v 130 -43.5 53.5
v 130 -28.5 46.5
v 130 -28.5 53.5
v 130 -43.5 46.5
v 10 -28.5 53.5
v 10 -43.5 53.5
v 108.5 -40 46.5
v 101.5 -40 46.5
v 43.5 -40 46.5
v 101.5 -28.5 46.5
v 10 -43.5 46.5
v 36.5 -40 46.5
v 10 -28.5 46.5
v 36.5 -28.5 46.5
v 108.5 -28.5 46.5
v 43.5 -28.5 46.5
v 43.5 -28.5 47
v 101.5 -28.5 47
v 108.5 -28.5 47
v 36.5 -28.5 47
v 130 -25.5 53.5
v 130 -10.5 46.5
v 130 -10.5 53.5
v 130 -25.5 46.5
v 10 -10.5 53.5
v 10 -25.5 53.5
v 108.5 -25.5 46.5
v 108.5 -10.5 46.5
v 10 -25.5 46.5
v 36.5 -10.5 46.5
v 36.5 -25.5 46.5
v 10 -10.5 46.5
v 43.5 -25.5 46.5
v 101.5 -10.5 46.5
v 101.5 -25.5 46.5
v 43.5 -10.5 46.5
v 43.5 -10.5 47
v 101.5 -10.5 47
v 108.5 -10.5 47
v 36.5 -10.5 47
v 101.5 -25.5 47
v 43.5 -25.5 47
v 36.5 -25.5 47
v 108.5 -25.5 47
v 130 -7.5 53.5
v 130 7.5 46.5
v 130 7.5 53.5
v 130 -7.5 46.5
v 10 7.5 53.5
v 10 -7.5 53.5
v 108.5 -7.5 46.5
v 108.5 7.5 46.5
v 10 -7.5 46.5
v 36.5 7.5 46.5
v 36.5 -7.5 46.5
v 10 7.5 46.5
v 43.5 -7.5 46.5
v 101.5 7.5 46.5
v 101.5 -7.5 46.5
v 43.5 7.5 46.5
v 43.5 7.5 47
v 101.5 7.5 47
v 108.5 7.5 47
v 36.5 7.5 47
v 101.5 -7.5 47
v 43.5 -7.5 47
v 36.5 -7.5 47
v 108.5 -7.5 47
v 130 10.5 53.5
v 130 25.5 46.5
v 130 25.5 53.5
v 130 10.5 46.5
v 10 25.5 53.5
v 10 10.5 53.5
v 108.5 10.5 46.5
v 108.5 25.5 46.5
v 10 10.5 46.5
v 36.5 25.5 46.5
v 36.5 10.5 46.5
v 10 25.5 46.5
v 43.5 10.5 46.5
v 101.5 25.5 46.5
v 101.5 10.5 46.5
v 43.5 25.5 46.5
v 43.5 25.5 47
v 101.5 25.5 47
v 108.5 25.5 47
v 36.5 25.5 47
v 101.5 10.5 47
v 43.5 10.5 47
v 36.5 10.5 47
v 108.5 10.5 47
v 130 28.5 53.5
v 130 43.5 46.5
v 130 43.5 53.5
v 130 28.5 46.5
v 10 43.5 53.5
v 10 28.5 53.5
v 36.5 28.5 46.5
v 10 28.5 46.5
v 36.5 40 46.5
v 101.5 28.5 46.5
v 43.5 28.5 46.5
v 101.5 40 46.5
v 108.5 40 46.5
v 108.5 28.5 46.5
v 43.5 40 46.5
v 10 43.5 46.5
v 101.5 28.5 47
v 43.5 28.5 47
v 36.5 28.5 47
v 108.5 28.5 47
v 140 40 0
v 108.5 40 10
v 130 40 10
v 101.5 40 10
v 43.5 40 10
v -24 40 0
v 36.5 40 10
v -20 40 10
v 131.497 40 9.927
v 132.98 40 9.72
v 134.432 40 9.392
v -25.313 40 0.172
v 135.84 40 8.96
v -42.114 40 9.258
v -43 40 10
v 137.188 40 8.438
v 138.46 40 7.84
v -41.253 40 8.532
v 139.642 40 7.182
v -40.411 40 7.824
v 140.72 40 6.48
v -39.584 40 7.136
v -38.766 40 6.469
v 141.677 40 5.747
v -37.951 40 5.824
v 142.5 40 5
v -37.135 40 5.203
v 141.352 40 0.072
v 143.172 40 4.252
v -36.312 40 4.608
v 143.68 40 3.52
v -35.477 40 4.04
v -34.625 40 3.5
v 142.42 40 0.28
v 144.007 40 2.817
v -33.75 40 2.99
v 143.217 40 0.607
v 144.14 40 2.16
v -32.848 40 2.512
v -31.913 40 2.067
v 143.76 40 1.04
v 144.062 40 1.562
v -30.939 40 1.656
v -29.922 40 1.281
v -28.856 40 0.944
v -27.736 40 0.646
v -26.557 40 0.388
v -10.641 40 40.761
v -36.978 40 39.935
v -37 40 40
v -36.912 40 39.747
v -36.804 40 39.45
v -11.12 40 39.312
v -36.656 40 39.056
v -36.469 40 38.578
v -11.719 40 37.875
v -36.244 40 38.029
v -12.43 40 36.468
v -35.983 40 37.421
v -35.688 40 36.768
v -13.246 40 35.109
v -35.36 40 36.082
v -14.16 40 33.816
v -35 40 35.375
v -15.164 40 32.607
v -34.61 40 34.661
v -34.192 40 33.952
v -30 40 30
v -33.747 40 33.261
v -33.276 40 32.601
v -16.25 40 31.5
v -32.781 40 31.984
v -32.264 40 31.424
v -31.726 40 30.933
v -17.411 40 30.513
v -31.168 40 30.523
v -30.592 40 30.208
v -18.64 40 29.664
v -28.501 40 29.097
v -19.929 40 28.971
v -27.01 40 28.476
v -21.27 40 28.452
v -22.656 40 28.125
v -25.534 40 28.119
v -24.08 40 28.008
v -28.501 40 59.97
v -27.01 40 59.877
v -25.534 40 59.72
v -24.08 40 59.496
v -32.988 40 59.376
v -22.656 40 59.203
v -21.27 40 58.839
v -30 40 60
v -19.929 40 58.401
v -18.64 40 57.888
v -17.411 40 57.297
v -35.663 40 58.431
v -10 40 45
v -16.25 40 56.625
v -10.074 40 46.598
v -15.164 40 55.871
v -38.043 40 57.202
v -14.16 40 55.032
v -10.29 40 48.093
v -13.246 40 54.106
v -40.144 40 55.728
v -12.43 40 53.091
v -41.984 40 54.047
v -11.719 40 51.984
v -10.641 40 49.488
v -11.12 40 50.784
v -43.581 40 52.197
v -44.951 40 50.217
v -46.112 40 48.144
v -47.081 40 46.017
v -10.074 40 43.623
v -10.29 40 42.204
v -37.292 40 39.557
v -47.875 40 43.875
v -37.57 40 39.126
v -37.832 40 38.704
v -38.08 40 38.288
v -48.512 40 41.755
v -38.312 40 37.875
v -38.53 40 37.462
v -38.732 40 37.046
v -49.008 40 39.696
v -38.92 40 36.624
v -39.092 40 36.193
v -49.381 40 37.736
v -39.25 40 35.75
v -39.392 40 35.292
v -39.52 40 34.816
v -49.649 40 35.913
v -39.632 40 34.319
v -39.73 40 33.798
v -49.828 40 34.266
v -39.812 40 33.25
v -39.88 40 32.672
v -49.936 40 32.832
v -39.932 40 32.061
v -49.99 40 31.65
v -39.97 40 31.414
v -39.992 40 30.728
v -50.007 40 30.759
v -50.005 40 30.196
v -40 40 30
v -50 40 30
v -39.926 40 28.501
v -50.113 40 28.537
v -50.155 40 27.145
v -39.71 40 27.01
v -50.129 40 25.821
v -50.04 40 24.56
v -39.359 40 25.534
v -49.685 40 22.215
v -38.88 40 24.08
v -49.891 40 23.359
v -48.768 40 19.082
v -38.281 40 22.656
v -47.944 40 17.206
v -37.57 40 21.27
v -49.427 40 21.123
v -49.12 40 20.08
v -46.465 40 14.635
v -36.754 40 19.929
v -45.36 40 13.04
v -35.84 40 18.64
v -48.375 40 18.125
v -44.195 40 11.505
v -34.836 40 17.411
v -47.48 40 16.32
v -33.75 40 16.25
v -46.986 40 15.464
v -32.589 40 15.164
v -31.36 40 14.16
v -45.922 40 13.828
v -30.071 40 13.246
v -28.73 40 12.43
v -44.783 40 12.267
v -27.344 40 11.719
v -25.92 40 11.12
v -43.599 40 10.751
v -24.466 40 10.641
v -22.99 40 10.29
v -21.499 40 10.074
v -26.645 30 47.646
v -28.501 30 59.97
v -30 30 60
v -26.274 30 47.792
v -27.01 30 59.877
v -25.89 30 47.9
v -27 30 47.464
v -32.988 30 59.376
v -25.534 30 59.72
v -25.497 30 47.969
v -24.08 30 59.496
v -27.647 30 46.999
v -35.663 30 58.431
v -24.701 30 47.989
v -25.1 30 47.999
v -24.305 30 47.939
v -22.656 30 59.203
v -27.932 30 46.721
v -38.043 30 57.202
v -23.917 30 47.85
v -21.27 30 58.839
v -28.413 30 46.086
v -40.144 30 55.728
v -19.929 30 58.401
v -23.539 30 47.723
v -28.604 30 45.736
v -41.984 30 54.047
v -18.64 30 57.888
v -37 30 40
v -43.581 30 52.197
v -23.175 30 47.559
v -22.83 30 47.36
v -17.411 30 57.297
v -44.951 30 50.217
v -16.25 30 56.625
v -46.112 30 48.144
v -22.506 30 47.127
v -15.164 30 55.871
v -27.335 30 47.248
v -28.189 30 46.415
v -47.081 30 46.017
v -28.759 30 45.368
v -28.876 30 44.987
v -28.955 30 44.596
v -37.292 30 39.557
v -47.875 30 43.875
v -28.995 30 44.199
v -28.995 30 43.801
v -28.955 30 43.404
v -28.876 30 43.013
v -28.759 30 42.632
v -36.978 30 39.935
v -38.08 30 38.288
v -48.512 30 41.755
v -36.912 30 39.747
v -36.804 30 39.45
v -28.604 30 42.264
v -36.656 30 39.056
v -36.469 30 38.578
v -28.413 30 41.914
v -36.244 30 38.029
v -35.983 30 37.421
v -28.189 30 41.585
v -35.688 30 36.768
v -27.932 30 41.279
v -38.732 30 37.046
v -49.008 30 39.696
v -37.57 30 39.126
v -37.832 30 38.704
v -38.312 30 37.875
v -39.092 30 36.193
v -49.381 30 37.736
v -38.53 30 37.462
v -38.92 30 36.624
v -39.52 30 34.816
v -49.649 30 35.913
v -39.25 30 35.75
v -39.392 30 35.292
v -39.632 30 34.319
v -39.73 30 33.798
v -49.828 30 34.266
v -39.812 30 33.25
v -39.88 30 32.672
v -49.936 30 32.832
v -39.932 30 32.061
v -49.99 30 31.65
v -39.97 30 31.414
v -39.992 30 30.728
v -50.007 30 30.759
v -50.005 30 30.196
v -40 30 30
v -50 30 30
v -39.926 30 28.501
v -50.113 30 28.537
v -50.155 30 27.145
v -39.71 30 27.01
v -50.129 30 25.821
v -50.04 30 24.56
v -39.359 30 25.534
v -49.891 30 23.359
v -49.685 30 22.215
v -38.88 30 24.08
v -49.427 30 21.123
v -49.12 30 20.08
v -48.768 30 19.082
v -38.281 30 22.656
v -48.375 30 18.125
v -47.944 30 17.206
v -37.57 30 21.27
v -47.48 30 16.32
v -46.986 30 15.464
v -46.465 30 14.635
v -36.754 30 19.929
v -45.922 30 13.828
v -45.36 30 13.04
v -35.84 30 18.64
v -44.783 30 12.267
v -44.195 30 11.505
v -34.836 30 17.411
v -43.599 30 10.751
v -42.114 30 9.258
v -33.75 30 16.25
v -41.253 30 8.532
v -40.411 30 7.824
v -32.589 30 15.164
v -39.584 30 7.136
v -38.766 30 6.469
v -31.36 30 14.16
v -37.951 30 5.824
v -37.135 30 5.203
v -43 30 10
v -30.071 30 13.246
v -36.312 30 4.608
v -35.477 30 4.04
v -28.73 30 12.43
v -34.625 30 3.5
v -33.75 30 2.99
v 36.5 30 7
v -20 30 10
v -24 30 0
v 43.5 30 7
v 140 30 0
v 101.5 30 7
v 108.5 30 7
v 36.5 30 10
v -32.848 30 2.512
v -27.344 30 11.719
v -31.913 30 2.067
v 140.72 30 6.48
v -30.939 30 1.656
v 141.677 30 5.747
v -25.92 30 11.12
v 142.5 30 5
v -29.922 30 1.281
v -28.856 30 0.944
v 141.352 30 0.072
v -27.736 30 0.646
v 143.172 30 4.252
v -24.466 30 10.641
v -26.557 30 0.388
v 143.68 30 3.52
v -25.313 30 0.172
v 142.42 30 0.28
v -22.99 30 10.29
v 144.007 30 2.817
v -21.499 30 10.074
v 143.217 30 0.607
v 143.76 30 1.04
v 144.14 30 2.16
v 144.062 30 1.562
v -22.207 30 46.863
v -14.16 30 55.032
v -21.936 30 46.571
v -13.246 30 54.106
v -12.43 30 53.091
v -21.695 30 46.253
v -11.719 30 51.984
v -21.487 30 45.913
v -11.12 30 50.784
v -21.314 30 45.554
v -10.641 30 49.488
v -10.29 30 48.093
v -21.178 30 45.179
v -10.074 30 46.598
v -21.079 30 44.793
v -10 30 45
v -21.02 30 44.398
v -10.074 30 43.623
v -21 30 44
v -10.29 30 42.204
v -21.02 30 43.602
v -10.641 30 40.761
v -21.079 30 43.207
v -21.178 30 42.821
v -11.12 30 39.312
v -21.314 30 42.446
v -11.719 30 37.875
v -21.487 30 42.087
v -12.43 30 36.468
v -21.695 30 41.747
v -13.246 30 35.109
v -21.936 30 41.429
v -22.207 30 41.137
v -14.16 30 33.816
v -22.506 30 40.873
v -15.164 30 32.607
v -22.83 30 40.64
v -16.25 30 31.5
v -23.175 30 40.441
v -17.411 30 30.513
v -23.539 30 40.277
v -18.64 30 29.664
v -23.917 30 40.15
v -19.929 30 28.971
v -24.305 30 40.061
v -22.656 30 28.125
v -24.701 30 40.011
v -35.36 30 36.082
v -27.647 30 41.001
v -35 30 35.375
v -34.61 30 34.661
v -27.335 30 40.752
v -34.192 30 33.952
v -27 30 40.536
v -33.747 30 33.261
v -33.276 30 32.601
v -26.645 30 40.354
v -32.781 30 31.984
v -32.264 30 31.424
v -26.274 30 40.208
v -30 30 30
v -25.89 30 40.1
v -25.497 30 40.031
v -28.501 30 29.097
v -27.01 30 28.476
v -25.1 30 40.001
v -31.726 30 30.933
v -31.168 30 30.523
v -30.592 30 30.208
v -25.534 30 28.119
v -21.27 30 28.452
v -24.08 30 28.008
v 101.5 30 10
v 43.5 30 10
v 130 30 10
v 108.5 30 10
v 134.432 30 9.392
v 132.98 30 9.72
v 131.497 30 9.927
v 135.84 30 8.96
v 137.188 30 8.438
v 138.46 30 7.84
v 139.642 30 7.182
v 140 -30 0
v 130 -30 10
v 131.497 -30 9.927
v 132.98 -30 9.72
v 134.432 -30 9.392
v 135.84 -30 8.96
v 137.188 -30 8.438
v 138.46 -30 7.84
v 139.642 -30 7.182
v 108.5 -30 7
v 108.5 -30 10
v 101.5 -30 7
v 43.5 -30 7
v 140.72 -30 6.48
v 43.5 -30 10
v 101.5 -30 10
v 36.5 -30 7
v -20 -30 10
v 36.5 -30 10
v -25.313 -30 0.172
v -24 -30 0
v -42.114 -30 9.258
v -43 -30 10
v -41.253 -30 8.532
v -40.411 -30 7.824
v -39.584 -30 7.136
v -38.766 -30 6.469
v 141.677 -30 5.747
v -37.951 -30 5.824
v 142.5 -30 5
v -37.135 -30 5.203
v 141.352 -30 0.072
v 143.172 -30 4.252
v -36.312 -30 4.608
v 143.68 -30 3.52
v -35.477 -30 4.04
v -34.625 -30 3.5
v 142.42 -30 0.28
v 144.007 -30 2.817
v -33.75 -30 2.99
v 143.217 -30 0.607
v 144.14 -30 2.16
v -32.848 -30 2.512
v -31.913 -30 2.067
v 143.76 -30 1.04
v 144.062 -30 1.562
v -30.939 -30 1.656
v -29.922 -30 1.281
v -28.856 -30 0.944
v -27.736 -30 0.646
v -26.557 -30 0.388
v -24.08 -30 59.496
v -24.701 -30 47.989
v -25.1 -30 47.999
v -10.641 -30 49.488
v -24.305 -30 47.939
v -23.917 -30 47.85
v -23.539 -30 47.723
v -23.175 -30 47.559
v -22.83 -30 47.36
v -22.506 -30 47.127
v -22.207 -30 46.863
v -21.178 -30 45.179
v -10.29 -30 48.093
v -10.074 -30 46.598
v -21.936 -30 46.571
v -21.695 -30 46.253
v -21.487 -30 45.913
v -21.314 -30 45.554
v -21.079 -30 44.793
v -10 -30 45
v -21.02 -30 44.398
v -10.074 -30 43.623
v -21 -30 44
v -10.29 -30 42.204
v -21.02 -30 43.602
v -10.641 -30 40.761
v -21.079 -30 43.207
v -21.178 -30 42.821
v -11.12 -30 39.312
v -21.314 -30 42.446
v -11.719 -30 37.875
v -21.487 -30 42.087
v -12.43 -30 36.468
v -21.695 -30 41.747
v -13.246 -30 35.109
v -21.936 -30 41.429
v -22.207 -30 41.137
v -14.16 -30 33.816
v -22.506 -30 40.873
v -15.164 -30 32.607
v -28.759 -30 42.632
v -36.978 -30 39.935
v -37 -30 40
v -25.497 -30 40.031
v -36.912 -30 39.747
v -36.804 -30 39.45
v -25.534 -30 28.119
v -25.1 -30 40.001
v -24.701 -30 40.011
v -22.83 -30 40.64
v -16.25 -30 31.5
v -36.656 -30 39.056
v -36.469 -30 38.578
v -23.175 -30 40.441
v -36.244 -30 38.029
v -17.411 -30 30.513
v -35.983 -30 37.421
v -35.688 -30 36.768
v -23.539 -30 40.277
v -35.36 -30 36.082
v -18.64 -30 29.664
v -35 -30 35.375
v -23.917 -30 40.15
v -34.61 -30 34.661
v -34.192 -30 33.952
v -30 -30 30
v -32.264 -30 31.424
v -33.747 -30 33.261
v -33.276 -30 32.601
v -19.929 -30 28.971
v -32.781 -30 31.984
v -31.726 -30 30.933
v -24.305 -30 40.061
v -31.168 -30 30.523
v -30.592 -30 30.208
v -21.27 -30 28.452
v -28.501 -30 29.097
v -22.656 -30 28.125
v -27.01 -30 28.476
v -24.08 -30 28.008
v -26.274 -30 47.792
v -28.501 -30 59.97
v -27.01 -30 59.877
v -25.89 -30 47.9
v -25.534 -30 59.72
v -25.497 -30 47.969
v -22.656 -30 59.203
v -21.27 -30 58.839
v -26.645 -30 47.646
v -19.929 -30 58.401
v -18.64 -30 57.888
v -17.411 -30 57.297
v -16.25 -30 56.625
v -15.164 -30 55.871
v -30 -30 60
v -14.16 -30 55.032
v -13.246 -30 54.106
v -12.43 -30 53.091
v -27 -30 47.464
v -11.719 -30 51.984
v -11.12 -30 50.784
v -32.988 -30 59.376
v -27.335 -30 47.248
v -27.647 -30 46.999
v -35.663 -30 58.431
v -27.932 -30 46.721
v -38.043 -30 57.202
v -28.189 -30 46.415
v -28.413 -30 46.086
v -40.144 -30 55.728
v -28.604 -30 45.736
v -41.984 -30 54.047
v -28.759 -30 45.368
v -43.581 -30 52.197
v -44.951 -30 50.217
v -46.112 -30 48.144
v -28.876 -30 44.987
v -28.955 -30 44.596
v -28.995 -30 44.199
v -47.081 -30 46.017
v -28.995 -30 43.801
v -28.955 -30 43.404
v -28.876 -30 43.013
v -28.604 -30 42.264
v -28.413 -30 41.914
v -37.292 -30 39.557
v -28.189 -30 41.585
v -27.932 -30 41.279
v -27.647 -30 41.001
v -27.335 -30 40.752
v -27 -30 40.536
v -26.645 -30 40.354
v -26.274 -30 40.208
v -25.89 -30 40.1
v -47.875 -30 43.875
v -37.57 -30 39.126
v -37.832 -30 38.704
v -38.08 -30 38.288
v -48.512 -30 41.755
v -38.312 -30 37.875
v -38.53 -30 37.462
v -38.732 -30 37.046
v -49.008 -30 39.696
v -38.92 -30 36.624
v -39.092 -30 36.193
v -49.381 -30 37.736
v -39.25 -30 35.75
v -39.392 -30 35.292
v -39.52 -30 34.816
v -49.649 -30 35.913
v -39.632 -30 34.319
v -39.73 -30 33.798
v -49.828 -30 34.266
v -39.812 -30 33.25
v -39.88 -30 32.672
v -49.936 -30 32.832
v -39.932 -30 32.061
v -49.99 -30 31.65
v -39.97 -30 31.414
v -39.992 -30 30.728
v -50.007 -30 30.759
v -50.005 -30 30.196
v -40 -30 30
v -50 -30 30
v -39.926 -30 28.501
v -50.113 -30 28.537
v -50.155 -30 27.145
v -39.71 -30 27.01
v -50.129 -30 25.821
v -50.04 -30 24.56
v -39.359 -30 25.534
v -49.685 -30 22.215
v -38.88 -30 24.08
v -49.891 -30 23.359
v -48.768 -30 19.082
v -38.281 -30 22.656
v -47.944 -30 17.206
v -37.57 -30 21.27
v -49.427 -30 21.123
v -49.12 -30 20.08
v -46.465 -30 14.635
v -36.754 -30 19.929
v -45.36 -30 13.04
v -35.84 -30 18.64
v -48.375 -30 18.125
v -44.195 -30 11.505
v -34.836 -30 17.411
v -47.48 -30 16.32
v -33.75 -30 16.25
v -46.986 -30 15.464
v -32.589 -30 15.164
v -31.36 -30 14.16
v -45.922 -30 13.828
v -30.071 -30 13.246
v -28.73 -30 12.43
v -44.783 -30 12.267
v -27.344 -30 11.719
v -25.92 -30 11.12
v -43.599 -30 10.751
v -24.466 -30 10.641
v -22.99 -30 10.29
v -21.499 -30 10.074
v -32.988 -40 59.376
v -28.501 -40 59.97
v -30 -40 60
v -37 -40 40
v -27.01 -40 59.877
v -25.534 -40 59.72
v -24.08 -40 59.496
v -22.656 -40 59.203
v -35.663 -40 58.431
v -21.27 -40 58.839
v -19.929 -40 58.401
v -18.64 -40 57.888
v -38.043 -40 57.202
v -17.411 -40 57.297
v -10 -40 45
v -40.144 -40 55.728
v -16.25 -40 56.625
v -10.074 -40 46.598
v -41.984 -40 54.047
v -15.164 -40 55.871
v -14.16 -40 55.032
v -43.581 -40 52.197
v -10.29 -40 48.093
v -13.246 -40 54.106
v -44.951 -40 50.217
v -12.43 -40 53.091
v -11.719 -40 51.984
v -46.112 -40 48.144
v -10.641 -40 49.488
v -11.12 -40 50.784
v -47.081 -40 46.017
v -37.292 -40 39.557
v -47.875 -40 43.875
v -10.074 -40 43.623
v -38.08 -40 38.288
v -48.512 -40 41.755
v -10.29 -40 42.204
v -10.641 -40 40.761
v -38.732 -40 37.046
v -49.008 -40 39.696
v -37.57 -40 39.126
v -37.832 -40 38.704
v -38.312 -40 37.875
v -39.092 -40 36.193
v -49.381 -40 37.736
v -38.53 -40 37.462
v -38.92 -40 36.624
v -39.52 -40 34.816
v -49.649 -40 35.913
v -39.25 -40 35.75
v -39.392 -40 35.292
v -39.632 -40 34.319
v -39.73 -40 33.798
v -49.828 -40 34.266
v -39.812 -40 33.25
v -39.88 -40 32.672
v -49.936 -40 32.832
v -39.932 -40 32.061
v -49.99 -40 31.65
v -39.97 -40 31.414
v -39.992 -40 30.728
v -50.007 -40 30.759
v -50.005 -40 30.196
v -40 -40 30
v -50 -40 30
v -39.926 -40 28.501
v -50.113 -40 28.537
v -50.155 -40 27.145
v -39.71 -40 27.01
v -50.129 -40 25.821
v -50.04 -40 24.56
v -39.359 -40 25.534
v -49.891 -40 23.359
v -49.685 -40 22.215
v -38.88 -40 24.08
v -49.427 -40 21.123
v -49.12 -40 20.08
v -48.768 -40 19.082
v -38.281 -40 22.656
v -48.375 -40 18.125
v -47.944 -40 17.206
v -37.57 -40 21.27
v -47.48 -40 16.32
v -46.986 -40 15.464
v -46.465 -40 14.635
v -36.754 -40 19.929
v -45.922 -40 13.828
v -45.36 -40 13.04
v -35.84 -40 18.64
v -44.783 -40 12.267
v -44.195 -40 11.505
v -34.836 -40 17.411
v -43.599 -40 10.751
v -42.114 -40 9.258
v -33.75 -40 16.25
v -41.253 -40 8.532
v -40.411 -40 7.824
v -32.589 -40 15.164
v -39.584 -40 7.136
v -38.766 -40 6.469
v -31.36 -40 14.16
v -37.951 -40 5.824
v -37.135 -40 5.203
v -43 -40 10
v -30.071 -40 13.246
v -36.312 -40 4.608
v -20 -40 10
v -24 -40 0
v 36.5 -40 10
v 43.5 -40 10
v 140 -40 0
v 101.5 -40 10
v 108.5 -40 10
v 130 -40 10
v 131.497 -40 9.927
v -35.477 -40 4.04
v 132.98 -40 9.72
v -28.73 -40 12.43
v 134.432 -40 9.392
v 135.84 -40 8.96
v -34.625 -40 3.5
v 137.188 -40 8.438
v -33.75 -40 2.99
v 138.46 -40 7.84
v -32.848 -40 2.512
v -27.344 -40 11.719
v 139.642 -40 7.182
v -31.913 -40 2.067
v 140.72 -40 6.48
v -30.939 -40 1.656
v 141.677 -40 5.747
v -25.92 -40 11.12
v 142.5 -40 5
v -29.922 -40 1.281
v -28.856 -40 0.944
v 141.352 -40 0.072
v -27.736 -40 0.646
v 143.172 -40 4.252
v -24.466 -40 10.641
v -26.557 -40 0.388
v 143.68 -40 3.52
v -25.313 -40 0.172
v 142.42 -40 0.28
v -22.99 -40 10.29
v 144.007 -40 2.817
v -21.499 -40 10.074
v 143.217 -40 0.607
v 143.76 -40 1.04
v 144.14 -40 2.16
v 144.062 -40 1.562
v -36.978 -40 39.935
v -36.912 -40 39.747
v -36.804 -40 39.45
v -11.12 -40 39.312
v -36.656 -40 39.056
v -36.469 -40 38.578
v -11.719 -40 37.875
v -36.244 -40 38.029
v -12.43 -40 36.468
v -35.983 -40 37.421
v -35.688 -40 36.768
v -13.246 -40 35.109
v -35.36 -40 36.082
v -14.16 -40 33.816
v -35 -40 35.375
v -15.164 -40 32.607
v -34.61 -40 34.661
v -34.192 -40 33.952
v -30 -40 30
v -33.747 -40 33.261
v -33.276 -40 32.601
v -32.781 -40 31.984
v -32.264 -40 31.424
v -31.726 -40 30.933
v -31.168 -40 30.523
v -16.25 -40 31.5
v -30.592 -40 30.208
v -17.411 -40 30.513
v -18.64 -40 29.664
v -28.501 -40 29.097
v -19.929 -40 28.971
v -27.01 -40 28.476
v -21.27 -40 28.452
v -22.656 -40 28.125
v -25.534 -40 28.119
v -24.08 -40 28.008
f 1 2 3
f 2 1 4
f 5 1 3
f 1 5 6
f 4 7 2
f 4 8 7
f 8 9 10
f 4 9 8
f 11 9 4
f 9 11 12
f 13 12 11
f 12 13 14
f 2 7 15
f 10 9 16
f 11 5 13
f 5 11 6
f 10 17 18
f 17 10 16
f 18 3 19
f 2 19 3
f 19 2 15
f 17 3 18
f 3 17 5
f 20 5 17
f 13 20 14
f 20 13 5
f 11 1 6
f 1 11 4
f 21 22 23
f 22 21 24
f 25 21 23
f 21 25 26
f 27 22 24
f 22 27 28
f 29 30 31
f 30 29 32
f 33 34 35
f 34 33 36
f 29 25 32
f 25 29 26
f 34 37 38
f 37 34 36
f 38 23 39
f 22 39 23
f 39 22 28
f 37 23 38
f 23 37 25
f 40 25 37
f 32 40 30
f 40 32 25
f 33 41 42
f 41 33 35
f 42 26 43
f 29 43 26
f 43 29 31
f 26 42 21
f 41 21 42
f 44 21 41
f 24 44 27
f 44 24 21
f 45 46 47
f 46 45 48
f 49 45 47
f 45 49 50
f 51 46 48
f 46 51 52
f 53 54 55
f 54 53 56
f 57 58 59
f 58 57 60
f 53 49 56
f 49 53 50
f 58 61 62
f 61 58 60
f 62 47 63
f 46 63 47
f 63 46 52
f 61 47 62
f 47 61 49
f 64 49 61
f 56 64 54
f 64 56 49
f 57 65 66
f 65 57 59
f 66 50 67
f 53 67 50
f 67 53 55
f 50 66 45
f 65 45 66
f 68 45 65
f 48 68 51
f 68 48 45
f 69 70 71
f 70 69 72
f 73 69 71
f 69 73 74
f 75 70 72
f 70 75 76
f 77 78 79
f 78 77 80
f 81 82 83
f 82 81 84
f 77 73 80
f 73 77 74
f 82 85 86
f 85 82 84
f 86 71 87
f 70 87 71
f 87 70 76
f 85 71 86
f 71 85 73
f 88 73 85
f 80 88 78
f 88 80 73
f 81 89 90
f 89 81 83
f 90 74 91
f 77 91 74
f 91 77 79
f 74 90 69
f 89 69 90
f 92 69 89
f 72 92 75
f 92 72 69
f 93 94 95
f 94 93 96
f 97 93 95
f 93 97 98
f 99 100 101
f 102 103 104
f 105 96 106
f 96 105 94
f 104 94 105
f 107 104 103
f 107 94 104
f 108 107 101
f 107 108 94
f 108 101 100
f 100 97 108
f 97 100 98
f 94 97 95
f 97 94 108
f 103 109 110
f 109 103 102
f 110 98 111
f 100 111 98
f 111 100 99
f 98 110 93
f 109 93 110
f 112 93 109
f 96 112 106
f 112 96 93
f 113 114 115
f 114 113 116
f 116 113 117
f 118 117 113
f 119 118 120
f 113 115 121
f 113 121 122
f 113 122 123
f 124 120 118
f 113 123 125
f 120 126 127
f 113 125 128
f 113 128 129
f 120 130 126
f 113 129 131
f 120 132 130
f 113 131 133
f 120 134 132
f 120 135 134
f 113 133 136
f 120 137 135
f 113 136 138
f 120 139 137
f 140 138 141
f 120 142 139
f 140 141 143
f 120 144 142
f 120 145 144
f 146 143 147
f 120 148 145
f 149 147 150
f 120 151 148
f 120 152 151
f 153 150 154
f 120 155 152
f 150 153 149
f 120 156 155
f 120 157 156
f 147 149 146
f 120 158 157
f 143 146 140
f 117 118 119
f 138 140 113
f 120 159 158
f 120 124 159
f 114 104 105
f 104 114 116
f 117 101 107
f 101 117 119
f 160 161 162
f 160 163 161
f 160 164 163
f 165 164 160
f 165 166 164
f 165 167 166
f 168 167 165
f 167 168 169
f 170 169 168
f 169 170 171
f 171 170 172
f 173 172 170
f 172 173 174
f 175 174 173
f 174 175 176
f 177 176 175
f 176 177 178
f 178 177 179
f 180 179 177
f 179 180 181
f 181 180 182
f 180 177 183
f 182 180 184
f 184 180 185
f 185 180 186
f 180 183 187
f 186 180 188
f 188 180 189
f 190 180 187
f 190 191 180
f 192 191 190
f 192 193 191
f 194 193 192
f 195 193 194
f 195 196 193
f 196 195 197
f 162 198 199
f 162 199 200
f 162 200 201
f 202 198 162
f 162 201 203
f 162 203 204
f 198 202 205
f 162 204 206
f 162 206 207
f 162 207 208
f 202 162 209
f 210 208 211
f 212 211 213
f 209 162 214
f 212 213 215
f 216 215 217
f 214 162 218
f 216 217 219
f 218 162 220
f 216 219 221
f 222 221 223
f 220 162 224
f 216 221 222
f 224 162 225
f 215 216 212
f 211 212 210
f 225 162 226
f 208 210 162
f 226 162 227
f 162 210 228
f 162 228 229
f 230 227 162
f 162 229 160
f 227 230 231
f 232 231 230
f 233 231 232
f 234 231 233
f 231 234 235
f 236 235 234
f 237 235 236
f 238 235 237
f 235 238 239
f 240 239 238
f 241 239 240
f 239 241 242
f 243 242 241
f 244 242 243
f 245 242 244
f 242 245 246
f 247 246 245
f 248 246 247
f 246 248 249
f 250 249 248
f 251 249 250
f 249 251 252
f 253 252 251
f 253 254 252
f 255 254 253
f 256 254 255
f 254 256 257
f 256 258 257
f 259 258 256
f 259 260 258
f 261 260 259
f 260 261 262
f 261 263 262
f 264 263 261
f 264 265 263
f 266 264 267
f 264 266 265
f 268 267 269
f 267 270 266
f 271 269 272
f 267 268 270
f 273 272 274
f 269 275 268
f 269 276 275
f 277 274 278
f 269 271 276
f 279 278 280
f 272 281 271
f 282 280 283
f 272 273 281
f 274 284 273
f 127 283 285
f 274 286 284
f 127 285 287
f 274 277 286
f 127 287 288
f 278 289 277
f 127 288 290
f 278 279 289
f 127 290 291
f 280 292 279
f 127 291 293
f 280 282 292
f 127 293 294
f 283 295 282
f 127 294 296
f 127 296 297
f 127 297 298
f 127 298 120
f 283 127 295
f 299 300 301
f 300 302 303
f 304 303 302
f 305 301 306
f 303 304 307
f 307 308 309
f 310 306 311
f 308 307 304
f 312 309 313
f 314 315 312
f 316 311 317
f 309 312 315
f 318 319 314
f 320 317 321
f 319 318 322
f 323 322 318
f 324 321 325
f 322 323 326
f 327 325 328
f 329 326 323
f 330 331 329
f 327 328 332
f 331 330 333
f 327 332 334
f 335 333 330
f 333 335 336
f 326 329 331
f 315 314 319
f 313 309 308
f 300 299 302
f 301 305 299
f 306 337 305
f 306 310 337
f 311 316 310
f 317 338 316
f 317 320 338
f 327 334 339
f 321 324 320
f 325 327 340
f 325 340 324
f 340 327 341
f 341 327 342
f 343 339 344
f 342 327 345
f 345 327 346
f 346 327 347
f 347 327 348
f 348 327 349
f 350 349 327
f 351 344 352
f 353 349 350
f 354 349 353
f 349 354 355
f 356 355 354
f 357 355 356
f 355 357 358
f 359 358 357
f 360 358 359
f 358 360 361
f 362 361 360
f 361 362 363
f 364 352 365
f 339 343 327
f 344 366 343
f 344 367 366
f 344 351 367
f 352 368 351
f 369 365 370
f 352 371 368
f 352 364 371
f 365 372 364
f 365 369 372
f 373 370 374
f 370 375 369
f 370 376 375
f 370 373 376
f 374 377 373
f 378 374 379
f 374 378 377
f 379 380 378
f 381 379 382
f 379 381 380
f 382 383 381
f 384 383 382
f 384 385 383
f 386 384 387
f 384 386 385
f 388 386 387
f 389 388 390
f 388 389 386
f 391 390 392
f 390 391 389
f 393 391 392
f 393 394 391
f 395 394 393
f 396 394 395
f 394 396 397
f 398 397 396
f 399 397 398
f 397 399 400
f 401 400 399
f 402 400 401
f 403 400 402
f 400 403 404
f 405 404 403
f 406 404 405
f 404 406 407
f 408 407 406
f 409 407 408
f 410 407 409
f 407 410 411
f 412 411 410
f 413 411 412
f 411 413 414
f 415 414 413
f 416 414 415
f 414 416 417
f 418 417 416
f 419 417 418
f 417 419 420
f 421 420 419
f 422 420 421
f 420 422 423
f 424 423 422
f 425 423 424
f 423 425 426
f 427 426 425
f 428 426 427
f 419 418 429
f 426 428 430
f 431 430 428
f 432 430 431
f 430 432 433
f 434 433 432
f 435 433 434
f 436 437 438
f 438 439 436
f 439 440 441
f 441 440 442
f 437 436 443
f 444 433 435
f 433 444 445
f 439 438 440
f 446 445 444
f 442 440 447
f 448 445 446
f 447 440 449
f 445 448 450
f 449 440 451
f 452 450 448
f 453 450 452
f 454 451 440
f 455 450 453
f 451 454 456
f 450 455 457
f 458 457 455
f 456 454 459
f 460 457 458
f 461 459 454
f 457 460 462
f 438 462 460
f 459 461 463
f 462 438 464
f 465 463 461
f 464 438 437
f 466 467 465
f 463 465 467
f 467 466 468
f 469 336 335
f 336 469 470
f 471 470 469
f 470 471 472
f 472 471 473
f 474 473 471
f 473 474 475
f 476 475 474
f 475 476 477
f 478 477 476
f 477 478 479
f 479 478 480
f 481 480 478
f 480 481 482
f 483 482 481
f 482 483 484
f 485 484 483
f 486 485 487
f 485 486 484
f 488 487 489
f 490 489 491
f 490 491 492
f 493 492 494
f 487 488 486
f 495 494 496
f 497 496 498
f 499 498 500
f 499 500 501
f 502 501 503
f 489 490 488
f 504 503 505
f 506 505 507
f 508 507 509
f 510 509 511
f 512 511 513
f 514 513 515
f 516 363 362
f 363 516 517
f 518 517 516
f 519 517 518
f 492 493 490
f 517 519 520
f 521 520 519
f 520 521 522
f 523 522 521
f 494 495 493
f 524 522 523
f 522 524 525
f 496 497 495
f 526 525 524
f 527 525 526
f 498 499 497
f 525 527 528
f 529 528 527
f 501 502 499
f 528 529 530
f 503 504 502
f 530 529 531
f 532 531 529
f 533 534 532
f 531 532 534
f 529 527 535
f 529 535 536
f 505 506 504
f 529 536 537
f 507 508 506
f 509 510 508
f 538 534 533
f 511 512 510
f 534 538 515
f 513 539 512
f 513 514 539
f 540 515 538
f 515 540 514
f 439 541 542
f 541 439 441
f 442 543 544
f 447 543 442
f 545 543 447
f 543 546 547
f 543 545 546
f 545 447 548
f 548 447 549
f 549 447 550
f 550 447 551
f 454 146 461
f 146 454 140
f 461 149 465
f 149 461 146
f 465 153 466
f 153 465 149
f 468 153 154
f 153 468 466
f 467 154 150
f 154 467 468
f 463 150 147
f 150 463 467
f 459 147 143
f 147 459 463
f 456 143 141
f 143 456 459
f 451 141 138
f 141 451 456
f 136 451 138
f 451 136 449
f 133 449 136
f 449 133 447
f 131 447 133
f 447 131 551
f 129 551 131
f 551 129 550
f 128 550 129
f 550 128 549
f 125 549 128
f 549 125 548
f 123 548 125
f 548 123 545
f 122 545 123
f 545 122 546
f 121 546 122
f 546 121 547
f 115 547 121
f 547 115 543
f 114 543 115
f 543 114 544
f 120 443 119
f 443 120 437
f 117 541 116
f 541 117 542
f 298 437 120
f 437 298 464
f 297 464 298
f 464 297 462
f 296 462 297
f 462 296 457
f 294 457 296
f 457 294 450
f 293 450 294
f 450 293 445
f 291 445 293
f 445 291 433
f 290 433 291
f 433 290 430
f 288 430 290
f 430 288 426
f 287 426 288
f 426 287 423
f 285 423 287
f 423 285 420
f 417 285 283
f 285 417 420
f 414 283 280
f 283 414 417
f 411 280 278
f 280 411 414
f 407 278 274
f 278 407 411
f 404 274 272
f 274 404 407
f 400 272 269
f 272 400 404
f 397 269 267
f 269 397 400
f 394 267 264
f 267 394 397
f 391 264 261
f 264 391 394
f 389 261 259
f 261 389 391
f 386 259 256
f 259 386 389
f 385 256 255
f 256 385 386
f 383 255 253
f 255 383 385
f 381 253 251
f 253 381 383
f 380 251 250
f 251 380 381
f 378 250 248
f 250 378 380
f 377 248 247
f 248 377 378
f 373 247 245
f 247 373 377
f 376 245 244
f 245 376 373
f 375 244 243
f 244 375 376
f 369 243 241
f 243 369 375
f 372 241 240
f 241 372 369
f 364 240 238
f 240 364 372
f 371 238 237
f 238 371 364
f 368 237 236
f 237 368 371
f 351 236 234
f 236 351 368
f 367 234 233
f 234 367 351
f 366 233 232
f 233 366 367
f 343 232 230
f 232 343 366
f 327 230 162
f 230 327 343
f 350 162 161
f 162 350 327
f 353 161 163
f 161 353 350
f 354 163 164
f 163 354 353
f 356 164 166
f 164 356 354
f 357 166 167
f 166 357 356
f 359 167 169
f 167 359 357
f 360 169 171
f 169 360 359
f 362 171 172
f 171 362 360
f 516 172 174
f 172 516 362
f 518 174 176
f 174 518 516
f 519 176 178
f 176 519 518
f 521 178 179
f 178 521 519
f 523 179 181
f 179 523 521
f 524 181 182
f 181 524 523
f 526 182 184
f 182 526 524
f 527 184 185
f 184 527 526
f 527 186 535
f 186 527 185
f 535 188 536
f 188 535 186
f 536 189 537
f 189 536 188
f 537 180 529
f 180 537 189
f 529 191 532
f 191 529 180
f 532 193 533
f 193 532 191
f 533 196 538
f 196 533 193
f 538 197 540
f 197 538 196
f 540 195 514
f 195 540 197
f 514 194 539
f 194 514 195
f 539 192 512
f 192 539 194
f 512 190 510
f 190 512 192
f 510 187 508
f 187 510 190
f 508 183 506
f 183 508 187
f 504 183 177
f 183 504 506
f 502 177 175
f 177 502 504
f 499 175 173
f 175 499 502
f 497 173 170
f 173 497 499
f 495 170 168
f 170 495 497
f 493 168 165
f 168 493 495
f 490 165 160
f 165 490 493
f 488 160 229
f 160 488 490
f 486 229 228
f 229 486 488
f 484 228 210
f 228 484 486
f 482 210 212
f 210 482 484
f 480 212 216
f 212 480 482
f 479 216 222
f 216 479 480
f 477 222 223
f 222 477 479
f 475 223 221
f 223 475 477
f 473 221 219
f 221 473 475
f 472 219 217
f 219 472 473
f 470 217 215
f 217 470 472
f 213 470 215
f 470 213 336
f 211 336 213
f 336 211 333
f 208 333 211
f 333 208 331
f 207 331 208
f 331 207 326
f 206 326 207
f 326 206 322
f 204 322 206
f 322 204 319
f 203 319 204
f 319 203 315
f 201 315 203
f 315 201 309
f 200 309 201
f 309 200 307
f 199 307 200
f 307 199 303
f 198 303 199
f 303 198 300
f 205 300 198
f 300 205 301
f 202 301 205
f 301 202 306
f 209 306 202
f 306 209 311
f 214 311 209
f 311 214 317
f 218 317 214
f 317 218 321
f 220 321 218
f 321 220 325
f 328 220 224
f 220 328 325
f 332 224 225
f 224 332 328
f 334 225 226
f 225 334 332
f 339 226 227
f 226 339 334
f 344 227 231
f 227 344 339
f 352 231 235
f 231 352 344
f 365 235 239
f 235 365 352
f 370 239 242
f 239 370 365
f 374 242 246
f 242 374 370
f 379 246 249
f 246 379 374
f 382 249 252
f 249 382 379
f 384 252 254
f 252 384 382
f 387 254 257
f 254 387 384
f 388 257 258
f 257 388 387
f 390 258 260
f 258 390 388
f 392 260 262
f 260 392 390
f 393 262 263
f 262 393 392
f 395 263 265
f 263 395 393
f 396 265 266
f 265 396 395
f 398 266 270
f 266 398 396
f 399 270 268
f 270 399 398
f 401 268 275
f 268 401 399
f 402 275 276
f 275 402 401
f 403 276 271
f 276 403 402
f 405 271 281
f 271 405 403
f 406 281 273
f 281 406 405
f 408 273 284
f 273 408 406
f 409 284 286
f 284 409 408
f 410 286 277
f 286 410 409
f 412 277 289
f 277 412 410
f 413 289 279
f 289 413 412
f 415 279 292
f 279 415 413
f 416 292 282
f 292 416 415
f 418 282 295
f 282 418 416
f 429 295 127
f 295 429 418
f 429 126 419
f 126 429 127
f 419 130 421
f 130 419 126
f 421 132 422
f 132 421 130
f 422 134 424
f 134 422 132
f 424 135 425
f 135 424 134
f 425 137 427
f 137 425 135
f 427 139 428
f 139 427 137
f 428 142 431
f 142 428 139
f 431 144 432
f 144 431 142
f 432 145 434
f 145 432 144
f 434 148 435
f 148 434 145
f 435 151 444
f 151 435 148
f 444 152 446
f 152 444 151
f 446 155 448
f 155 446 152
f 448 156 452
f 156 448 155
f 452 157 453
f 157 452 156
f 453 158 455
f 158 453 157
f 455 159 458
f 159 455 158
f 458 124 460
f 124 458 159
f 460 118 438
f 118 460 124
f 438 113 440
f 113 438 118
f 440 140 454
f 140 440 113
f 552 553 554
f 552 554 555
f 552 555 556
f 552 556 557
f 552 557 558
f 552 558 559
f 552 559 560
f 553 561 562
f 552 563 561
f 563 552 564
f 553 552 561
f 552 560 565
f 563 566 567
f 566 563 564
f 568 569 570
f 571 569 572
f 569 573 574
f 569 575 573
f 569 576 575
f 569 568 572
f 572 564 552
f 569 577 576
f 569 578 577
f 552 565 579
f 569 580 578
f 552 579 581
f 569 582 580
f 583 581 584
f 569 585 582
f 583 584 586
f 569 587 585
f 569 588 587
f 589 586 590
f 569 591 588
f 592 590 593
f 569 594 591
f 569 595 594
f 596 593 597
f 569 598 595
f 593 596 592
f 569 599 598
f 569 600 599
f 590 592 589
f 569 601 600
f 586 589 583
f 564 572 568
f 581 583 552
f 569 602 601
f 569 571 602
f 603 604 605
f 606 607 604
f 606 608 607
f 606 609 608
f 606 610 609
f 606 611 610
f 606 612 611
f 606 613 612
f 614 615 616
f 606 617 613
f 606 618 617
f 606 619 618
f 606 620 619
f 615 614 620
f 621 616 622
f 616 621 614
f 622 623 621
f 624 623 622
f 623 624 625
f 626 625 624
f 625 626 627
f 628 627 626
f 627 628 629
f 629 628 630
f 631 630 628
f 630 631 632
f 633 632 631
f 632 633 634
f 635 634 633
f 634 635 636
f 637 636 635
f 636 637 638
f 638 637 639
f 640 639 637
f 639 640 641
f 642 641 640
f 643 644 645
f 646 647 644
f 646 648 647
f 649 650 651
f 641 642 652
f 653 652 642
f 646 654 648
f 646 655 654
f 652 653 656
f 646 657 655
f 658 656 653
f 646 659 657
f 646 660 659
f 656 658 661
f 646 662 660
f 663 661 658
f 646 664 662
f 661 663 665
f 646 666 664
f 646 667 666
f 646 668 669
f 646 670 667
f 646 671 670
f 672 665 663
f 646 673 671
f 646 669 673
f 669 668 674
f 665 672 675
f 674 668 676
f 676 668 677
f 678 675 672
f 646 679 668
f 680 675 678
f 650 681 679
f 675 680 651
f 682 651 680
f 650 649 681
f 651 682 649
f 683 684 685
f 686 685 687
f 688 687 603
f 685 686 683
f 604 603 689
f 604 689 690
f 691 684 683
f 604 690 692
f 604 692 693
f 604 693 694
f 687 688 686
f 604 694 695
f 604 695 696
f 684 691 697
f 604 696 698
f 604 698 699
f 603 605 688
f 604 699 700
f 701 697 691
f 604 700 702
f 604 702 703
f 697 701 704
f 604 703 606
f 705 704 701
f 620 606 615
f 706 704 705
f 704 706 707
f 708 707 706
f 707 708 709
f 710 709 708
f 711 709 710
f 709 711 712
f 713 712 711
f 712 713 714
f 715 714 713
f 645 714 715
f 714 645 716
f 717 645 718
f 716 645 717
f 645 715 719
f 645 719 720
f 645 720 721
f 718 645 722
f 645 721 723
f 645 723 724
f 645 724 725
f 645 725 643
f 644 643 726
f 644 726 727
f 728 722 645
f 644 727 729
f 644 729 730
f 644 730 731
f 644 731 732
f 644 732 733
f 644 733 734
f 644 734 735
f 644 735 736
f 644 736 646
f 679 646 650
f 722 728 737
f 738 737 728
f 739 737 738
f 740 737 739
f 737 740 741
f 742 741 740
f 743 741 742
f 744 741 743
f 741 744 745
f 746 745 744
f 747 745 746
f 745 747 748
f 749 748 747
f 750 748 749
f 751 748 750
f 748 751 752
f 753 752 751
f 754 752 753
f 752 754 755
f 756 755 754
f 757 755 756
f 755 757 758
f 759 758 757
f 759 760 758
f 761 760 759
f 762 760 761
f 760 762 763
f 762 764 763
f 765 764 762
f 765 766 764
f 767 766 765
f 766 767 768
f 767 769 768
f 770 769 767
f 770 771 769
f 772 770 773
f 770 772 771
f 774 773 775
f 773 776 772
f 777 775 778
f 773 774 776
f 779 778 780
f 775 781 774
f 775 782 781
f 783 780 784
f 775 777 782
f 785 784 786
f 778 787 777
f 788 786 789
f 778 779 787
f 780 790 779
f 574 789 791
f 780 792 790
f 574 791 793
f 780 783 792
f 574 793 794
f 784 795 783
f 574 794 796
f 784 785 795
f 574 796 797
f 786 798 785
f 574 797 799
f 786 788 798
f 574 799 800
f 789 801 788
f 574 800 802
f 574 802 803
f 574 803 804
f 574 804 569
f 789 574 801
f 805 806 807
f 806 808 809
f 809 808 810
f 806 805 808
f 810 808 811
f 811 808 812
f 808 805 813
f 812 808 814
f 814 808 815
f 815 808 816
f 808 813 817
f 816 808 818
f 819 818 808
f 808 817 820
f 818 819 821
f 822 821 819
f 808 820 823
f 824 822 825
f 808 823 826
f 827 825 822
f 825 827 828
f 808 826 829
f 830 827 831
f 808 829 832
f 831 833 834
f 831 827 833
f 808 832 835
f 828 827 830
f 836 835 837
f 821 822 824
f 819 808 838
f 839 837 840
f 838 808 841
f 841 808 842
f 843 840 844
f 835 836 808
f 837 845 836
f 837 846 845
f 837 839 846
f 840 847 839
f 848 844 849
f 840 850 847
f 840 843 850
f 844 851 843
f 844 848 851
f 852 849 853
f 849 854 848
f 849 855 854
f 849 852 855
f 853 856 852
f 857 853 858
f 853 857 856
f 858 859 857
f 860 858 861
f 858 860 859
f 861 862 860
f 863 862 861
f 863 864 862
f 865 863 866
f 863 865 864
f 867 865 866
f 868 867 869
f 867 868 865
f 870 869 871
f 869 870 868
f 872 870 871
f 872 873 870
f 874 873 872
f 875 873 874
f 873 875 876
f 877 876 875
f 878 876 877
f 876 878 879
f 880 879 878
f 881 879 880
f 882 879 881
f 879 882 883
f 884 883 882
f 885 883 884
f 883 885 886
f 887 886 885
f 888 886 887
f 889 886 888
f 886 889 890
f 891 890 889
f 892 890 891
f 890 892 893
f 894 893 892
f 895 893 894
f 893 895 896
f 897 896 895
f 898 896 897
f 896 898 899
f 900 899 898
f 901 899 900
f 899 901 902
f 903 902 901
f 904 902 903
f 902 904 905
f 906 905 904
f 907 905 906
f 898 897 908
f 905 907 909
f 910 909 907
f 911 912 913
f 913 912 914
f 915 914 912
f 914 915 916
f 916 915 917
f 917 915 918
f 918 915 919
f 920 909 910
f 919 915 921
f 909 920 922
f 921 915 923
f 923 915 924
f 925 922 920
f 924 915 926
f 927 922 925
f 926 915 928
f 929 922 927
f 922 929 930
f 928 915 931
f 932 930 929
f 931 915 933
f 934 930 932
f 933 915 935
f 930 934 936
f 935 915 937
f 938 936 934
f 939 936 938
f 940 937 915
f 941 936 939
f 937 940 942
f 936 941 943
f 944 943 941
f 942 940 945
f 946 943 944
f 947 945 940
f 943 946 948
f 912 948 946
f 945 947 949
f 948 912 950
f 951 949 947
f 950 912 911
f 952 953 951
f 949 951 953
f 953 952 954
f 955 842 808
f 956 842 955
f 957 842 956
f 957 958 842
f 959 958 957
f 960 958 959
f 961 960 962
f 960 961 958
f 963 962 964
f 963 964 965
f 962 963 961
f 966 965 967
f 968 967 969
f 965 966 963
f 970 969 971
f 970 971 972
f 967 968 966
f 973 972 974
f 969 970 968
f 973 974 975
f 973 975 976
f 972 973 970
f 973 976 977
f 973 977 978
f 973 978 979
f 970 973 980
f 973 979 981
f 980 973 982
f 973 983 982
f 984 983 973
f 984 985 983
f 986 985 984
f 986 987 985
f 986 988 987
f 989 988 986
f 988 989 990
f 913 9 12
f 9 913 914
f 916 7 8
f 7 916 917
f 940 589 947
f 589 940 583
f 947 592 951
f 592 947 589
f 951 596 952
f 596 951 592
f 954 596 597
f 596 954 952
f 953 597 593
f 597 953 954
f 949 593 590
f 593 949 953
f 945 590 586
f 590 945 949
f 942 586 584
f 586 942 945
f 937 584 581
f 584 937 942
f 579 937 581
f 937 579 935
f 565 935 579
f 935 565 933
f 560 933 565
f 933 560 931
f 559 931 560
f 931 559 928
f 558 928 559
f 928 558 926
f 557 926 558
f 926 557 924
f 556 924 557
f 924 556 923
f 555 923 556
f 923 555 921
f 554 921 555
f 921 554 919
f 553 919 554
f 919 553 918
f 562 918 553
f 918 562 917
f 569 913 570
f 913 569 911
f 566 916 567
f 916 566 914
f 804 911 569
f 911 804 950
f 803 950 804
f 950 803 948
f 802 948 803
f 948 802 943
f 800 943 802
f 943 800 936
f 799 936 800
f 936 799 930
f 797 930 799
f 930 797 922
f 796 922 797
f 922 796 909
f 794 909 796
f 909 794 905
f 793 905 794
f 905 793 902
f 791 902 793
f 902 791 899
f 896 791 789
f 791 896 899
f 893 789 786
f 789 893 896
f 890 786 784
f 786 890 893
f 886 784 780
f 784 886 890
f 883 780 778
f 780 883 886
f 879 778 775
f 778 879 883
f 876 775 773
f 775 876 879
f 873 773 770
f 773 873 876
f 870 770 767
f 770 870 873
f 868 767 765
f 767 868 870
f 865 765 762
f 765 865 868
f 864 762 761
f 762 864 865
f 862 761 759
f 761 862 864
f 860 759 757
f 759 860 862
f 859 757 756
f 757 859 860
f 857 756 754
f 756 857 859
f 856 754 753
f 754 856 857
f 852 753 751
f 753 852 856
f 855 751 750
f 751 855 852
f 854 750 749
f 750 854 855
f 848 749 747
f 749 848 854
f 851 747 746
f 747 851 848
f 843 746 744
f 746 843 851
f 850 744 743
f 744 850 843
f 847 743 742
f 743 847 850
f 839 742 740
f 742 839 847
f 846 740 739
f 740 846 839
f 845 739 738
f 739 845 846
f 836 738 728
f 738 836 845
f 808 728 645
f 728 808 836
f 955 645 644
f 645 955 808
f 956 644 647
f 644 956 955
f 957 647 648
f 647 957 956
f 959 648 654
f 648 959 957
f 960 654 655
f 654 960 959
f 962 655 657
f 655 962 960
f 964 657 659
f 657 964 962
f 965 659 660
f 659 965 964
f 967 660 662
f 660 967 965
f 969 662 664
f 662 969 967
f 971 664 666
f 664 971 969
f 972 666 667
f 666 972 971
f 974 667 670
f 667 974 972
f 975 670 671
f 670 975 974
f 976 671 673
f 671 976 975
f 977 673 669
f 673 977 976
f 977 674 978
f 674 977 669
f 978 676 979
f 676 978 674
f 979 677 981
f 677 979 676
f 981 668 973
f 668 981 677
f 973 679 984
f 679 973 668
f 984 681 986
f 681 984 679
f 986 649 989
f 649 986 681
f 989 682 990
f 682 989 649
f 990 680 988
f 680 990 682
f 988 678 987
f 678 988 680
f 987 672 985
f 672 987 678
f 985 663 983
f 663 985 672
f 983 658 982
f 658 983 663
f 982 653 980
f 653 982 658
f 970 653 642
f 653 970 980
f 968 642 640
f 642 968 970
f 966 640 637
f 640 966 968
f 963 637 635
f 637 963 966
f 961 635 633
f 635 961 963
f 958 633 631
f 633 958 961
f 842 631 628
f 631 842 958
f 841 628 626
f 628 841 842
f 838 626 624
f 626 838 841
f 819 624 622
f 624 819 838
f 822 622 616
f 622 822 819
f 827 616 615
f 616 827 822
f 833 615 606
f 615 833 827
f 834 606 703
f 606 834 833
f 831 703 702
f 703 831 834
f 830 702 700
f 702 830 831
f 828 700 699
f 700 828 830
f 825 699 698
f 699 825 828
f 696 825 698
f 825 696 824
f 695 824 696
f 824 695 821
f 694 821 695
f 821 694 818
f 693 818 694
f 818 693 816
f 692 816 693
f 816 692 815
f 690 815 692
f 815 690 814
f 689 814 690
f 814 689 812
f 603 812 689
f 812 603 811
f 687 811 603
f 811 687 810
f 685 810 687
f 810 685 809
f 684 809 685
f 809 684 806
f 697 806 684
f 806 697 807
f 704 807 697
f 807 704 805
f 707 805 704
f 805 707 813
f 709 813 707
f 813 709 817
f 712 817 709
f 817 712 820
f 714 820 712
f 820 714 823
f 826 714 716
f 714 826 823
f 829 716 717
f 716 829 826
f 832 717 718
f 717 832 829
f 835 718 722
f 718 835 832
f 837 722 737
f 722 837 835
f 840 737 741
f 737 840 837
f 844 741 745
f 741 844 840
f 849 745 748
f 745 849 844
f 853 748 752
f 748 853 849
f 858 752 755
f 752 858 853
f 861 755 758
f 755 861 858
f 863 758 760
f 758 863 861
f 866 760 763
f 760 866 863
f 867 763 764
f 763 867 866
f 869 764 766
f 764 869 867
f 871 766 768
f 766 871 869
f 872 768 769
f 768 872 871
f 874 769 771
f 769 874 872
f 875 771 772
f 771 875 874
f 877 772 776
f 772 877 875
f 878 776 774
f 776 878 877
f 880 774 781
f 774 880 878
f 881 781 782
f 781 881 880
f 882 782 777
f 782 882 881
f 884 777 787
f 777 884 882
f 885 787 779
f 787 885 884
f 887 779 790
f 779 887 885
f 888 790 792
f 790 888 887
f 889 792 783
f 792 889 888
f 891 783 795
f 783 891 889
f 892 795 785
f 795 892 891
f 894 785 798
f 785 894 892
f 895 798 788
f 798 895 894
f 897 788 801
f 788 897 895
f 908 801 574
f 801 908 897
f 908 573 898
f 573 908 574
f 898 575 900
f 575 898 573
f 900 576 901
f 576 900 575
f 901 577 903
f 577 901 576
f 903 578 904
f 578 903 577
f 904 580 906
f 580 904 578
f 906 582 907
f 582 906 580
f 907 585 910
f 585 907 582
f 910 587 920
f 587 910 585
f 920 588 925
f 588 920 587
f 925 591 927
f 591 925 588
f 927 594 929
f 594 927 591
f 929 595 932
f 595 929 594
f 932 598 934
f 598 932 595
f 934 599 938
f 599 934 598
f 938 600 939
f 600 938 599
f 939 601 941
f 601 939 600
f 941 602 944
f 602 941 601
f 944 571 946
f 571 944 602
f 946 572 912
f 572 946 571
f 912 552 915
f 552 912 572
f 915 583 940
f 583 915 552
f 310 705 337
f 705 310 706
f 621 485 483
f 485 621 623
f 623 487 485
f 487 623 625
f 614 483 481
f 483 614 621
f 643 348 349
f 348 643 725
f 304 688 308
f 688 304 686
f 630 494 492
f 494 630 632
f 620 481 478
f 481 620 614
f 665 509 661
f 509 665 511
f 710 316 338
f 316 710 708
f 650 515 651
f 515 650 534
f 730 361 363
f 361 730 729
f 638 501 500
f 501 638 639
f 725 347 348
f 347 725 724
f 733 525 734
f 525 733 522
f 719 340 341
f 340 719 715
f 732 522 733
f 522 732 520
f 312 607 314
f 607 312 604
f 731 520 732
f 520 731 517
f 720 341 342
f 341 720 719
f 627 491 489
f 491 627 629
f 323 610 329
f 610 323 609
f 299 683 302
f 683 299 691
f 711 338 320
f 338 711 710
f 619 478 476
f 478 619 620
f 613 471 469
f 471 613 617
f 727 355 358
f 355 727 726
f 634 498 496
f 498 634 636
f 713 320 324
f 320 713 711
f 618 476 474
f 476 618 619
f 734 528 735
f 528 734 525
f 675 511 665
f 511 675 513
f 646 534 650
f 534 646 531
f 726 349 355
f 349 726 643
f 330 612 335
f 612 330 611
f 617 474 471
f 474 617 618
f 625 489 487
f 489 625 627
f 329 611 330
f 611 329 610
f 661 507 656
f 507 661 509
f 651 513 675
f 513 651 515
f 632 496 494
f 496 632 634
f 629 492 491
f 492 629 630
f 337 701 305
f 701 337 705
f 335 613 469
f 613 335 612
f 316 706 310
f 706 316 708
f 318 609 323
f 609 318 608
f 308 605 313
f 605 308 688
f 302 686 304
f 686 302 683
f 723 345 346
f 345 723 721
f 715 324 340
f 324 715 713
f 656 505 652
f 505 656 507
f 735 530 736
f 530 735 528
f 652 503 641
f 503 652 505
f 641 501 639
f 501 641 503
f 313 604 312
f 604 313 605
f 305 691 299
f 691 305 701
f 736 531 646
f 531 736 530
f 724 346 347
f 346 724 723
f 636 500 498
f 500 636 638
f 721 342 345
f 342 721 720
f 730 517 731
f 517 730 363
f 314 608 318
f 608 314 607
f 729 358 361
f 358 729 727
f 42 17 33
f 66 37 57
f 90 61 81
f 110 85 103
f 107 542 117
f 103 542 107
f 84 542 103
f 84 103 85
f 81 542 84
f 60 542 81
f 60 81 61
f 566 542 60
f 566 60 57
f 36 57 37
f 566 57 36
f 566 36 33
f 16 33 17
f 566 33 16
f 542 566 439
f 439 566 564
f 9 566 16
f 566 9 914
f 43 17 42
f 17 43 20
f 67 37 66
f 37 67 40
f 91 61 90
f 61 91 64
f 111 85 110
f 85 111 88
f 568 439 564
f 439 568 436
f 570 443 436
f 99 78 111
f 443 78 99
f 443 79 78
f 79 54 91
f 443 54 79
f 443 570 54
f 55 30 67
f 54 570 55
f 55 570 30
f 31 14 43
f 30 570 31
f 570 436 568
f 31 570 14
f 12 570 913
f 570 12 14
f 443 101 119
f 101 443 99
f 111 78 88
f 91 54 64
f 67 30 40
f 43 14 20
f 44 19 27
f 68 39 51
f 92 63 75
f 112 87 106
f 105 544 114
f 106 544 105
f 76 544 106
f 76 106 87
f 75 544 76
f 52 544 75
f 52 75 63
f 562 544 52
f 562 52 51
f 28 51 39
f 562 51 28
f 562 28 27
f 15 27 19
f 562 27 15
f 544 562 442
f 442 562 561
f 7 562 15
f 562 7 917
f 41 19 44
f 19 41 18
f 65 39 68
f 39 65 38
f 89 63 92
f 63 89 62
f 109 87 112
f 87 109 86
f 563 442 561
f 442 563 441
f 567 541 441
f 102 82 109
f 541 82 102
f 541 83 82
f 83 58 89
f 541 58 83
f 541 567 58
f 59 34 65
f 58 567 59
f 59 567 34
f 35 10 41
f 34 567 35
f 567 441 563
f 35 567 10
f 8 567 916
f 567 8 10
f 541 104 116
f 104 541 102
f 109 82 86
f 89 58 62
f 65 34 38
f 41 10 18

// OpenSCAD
$fa = 4; $fs = 0.4;

n = 20;

// calculate single bezier point in 2D
function bezierp(from, to, c1, c2, a) =
    from * pow(1 - a, 3)
    + c1 * 3 * pow(1 - a, 2) * a
    + c2 * 3 * pow(1 - a, 1) * pow(a, 2)
    + to * pow(a, 3);

// calculate points of cubic bezier
function bezier(p) = [
    for (i = [0:n])
       let(a =  i * 1 / n)
           bezierp(p[0], p[1], p[2], p[3], a)
];

beziers = [
    [ [140,  0], [130, 10], [150,  0], [140, 10] ],
    [ [ 90, 10], [-20, 10], [ 90, 10], [-20, 10] ],
    [ [-20, 10], [-40, 30], [-30, 10], [-40, 20] ],
    [ [-40, 30], [-37, 40], [-40, 35], [-39, 37] ],
    [ [-37, 40], [-30, 30], [-37, 40], [-34, 31] ],
    [ [-30, 30], [-10, 45], [-20, 23], [-10, 36] ],
    [ [-10, 45], [-30, 60], [-10, 56], [-20, 60] ],
    [ [-30, 60], [-50, 30], [-51, 57], [-50, 30] ],
    [ [-50, 30], [-43, 10], [-51, 20], [-47, 15] ],
    [ [-43, 10], [-24,  0], [-37,  5], [-33,  1] ],
];

bezier_points = [
    [0, 0],
    [100, 0],
    each for (a = [0 : len(beziers) - 1]) bezier(beziers[a])
];

module skid() {
    rotate([90, 0, 0])
        linear_extrude(10, center = true)
            polygon(bezier_points);
}

module sled() {
    color("SaddleBrown") {
        translate([0, 35, 0])
            skid();
        translate([0, -35, 0])
            skid();
        translate([-25, 0, 44])
            rotate([90, 0, 0])
                cylinder(r = 4, h = 70, center = true);
        translate([40, 0, 27]) cube([7, 80, 40], center = true);
        translate([105, 0, 27]) cube([7, 80, 40], center = true);
        translate([70, 0, 50])
            for (a = [-2 : 2])
                translate([0, a * 18, 0])
                    cube([120, 15, 7], center = true);
    }
}

sled();

/*

debug_bezier(beziers[9]);

module debug_bezierl(p, i) {
    color("black") hull() {
        translate(p[i]) cube(0.1, center = true);
        translate(p[i + 2]) cube(0.1, center = true);
    }
}

module debug_bezier(p) {
    color("blue") translate(p[0]) circle(0.5);
    color("red") translate(p[1]) circle(0.5);
    color("yellow") {
        translate(p[2]) circle(0.3);
        translate(p[3]) circle(0.3);
    }
    debug_bezierl(p, 0);
    debug_bezierl(p, 1);
}

*/

// Written in 2019 by Torsten Paul <Torsten.Paul@gmx.de>
//
// To the extent possible under law, the author(s) have dedicated all
// copyright and related and neighboring rights to this software to the
// public domain worldwide. This software is distributed without any
// warranty.
//
// You should have received a copy of the CC0 Public Domain
// Dedication along with this software.
// If not, see <http://creativecommons.org/publicdomain/zero/1.0/>.
